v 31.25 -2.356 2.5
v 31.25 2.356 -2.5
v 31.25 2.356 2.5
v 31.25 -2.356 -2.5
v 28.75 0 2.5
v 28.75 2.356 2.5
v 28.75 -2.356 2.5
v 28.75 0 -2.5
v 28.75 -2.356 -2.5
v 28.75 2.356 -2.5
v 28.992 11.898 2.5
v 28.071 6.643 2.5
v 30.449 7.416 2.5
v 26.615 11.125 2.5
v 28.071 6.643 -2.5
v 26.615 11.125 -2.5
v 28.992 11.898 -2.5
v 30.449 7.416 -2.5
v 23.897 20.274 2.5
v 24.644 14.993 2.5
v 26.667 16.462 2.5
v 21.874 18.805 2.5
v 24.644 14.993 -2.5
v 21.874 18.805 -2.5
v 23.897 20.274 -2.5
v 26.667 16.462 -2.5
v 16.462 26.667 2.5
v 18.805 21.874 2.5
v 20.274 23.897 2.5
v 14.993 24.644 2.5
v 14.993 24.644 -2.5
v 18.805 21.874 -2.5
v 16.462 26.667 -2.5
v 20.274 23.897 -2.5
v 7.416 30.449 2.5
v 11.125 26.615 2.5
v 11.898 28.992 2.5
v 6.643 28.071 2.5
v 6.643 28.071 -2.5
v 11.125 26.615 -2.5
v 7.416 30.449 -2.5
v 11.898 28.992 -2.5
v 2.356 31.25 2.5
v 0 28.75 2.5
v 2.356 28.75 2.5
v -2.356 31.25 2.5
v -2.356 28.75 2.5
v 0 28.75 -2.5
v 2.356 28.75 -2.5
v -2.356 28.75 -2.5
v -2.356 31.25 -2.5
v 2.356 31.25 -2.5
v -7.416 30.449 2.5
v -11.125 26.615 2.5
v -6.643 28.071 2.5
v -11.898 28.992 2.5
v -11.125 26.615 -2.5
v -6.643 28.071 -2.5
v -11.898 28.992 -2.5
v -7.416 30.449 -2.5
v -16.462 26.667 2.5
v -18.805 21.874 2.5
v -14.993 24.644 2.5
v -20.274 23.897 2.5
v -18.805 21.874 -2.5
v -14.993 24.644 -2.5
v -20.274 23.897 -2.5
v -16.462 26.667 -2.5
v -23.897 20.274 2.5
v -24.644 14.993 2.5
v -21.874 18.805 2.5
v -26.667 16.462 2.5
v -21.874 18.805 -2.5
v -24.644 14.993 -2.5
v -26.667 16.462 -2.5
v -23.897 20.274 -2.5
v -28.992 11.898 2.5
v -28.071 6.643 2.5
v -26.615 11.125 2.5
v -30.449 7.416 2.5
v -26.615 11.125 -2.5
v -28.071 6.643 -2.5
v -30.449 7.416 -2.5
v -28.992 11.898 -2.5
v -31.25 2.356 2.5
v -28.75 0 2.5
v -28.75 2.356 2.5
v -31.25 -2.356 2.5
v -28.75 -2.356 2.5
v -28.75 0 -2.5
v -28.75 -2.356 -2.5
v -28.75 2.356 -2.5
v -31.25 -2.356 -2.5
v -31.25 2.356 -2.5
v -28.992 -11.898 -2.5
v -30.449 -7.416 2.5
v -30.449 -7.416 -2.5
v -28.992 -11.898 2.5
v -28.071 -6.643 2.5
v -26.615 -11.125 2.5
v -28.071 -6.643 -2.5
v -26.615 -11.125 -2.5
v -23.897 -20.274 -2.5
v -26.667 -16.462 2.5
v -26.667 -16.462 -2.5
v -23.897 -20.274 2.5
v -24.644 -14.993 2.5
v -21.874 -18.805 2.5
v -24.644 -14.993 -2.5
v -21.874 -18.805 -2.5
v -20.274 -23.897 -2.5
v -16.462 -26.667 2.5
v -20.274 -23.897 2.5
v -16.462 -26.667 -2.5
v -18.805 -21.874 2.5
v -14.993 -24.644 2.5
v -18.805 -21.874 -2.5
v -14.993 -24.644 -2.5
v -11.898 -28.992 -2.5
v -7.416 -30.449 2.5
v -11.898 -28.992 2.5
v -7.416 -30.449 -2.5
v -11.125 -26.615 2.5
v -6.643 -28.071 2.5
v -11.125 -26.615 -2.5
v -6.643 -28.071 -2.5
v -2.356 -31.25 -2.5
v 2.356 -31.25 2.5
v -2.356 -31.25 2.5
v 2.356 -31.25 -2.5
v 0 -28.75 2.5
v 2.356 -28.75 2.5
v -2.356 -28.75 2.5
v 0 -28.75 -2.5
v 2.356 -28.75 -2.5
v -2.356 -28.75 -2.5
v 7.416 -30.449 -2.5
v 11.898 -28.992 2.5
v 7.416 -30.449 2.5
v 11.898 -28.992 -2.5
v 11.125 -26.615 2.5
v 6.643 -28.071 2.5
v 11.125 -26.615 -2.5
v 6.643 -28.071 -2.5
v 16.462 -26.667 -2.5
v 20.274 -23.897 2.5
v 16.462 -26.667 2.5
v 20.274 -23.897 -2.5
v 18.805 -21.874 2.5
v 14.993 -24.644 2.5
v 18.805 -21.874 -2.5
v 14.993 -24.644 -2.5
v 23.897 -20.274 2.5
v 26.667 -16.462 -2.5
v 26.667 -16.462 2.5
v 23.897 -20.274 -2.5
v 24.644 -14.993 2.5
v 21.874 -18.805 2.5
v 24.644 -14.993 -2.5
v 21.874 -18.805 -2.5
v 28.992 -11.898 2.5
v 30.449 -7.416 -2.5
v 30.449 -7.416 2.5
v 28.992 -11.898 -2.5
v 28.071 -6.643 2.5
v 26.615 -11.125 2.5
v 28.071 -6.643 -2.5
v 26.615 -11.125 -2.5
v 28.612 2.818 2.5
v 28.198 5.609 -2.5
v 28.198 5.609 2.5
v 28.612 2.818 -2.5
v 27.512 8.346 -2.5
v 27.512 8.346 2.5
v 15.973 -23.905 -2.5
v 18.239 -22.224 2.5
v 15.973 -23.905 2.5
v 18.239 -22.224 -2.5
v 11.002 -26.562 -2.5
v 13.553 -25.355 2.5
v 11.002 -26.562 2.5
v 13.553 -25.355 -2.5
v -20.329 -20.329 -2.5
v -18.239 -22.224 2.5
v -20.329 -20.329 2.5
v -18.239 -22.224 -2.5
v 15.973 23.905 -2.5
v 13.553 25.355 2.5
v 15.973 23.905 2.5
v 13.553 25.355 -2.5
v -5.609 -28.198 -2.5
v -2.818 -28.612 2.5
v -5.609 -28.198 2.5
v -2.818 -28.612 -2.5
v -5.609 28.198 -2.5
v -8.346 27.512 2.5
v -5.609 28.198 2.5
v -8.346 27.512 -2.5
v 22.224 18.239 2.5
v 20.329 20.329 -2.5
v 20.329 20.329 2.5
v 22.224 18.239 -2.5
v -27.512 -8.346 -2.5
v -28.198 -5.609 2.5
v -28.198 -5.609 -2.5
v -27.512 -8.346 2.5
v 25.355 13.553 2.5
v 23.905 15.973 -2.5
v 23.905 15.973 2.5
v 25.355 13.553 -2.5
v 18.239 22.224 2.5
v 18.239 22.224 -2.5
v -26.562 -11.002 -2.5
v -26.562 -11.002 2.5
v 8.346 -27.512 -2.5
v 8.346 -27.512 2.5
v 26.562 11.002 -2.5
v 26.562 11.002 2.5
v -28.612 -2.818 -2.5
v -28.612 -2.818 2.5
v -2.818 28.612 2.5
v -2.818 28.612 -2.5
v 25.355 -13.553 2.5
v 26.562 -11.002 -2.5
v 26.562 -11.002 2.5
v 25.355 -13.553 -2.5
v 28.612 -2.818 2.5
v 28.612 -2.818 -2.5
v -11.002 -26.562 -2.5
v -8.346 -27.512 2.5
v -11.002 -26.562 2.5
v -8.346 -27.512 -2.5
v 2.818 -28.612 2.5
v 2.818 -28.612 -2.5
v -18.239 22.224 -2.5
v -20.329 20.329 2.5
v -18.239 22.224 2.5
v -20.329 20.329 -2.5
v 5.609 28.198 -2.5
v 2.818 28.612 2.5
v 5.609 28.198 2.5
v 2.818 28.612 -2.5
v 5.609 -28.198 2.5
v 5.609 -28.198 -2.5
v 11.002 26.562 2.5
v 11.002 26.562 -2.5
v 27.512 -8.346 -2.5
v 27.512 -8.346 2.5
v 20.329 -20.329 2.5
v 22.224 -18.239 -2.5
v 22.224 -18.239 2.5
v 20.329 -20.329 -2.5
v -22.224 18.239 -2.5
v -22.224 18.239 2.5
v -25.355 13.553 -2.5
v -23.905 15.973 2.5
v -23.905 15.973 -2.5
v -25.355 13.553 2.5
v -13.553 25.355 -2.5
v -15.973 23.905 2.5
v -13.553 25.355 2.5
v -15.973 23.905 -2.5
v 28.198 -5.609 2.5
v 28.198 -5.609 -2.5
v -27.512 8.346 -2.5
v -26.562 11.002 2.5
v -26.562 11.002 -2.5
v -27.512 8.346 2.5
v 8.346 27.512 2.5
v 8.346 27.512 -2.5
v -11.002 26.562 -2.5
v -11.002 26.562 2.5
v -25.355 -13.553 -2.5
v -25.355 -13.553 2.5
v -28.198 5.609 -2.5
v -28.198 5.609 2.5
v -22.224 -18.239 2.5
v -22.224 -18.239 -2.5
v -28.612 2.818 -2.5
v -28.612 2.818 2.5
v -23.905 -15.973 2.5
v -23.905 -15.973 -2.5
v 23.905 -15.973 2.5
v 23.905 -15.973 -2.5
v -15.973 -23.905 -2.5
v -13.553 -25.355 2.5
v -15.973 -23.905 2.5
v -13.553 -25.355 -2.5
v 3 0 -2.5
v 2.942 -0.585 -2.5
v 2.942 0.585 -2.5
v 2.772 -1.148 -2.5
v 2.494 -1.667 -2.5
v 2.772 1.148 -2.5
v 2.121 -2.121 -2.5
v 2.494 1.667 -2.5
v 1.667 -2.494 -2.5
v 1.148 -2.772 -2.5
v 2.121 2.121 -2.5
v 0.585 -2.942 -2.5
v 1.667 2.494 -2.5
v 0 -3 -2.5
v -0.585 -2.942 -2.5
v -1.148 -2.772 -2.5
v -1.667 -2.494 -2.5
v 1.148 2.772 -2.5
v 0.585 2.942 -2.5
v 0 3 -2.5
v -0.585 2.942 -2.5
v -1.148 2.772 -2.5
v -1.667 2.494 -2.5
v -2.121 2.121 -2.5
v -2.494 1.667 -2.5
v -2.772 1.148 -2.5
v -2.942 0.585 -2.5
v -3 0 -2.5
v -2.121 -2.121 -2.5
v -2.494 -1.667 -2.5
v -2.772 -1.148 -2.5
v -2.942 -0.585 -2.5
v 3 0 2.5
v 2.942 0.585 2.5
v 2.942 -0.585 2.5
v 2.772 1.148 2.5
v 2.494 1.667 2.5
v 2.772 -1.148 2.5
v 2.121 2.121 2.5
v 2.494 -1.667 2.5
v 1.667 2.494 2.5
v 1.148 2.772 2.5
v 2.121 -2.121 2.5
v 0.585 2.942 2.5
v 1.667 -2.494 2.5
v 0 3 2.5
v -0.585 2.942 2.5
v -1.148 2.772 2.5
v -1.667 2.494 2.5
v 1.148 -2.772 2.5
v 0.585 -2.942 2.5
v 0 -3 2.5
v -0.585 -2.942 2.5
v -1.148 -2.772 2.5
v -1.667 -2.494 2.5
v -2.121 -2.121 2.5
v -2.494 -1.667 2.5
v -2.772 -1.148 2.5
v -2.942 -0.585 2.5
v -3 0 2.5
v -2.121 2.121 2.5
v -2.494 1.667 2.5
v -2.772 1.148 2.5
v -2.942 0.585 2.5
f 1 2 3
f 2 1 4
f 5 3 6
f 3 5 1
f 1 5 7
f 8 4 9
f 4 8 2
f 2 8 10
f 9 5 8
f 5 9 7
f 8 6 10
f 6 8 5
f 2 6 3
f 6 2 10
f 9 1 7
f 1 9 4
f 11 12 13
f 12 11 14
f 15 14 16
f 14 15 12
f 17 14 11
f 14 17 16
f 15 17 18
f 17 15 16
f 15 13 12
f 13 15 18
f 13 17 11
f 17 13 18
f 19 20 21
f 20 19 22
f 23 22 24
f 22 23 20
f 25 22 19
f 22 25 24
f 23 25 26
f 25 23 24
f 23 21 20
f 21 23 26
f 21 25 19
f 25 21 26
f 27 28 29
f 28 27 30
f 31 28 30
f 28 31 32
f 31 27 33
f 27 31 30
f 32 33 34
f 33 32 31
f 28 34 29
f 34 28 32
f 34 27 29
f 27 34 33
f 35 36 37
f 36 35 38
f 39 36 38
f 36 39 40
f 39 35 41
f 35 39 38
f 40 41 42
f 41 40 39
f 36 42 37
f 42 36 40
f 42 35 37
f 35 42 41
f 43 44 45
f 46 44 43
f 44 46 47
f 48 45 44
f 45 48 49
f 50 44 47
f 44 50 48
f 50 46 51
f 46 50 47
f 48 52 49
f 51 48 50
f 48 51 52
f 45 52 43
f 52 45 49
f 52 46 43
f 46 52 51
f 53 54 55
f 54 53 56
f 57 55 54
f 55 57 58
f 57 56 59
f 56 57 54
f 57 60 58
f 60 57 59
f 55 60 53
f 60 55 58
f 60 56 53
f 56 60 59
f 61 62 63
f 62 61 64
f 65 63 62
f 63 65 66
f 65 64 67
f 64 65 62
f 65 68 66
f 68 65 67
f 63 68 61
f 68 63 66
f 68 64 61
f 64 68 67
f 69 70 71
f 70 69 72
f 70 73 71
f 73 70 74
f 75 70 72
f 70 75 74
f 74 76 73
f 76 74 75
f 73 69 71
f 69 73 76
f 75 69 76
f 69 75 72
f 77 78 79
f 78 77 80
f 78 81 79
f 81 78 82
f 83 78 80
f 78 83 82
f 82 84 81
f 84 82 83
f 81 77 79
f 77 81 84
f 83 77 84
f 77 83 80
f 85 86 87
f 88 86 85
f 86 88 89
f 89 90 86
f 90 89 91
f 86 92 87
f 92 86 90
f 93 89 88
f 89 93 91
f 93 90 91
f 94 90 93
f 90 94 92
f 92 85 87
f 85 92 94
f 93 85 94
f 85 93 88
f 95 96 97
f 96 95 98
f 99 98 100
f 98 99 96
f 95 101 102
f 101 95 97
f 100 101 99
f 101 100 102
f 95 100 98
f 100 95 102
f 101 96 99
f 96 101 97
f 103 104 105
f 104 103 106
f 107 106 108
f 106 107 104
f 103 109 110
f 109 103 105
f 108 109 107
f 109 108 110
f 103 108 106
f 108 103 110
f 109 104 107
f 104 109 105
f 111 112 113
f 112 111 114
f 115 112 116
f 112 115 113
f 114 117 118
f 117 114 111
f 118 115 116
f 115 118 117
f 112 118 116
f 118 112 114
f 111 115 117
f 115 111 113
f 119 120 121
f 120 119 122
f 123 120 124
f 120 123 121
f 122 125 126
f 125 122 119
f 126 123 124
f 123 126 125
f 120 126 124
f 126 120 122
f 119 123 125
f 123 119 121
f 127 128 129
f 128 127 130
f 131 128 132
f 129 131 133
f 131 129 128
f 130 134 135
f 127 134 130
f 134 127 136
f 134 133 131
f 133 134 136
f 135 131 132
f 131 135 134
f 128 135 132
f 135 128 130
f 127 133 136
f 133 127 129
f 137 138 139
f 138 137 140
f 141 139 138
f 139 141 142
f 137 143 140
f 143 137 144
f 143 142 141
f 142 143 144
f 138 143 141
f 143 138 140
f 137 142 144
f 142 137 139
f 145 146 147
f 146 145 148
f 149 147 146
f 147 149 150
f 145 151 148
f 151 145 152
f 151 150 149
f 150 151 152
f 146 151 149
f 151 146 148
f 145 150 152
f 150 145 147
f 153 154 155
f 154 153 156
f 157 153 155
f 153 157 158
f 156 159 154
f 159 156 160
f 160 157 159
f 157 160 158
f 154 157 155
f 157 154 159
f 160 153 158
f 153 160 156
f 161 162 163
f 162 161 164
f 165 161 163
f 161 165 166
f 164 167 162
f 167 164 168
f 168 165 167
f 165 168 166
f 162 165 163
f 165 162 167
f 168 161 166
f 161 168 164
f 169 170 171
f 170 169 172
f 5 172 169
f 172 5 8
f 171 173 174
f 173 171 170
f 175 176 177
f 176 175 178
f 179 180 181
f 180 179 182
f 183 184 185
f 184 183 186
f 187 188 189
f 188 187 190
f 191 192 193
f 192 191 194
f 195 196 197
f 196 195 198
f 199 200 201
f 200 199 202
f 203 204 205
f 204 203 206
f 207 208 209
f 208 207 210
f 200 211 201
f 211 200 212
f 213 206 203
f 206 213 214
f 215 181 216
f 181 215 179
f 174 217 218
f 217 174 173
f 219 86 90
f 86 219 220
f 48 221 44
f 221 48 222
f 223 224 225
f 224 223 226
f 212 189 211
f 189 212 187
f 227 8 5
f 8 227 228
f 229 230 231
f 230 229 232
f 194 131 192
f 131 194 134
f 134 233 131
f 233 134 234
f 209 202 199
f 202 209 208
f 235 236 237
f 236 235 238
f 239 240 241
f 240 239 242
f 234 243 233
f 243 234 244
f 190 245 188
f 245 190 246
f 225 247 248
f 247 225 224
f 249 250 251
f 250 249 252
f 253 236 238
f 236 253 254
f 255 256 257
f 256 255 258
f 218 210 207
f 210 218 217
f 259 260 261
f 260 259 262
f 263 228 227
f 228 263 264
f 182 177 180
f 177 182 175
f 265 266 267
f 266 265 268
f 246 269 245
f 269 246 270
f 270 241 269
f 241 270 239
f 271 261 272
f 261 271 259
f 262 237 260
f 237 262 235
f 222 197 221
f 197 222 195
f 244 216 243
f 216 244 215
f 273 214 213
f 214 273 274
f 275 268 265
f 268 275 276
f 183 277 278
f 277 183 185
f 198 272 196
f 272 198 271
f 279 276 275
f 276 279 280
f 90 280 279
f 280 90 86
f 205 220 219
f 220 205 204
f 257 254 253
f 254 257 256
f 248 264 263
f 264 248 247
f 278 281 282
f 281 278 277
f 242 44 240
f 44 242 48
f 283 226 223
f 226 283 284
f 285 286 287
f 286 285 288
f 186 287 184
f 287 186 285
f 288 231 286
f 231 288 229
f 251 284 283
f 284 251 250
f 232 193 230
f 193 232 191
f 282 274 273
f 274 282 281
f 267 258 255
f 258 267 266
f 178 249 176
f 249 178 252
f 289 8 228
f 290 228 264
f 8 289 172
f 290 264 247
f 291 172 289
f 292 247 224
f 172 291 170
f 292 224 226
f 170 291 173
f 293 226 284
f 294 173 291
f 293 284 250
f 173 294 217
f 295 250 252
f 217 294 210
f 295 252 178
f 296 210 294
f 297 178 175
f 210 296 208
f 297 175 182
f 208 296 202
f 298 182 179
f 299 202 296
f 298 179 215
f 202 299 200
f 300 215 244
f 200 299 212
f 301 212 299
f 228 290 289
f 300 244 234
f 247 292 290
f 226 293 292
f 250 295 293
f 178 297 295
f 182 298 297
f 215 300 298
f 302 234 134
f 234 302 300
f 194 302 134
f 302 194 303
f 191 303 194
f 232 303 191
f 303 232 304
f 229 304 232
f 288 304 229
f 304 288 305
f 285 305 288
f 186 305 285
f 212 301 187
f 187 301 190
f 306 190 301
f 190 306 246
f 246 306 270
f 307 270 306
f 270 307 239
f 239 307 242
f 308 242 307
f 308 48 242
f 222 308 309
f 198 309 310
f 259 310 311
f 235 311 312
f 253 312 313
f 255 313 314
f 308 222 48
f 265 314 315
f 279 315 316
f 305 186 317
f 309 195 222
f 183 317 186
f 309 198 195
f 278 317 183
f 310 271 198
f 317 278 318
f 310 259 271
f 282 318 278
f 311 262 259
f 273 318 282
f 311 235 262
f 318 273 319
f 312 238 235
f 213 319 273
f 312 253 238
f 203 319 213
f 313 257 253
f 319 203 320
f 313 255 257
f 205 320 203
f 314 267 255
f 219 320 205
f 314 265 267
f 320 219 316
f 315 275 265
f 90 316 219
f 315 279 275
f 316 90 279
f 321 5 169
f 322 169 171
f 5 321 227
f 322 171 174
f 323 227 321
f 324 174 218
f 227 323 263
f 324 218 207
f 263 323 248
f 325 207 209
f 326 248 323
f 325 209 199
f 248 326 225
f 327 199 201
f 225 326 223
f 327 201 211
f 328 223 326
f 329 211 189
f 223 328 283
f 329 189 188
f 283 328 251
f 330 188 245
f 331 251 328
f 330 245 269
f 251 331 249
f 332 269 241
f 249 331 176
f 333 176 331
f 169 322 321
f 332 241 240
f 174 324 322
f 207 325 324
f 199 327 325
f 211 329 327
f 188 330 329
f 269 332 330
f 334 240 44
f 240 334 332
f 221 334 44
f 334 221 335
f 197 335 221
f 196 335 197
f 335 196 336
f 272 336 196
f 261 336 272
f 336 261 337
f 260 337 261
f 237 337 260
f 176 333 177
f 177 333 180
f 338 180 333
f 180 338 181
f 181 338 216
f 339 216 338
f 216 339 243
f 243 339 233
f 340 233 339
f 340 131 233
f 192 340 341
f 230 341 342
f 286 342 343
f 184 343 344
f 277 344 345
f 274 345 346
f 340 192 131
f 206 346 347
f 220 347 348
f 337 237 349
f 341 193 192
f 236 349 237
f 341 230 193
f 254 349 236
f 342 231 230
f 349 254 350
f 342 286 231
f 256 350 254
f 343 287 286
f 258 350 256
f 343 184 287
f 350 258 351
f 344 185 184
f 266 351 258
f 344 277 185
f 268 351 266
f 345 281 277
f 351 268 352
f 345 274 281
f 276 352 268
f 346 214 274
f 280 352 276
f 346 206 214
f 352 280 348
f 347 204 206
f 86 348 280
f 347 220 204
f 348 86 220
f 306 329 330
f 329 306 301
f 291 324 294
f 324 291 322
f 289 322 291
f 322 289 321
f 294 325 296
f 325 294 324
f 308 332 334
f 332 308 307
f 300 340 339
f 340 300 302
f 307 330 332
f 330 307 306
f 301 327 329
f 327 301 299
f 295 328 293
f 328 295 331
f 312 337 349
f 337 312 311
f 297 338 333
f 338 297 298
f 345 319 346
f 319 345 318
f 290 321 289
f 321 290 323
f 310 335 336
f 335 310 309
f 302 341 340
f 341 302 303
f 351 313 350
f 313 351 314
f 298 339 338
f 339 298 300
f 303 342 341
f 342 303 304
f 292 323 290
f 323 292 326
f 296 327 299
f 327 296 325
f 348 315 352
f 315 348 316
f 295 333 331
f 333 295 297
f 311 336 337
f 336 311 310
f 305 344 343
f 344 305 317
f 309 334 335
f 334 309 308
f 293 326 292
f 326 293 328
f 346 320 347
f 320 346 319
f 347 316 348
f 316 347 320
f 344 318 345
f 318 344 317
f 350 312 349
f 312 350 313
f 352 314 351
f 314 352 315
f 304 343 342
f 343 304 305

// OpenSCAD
/* 
 * Customizable Gear
 * A parametric gear for mechanical applications
 */

// Parameters - these will be customizable in the UI
$teeth = 20;            // Number of teeth
$radius = 30;           // Outer radius of the gear
$thickness = 5;         // Thickness of the gear
$hole_diameter = 6;     // Central hole diameter (0 for no hole)
$has_keyway = false;    // Whether to include a keyway
$keyway_width = 3;      // Width of the keyway
$keyway_depth = 2;      // Depth of the keyway

// Main module
module main() {
    difference() {
        // Base gear
        gear($teeth, $radius, $thickness);
        
        // Central hole
        if ($hole_diameter > 0) {
            cylinder(h = $thickness + 1, d = $hole_diameter, center = true, $fn = 32);
            
            // Keyway if needed
            if ($has_keyway && $hole_diameter > 0) {
                keyway();
            }
        }
    }
}

// Gear module
module gear(teeth, radius, thickness) {
    tooth_depth = 2.5;
    tooth_width = 3.14159 * 2 * radius / teeth / 2;
    
    cylinder(h = thickness, r = radius - tooth_depth / 2, center = true, $fn = 64);
    
    for (i = [0:teeth-1]) {
        rotate([0, 0, i * 360 / teeth]) {
            translate([radius, 0, 0]) {
                cube([tooth_depth, tooth_width, thickness], center = true);
            }
        }
    }
}

// Keyway module
module keyway() {
    translate([$hole_diameter / 2, 0, 0]) {
        rotate([0, 0, 90]) {
            cube([$keyway_width, $keyway_depth, $thickness + 1], center = true);
        }
    }
}

// Execute the main module
main();
